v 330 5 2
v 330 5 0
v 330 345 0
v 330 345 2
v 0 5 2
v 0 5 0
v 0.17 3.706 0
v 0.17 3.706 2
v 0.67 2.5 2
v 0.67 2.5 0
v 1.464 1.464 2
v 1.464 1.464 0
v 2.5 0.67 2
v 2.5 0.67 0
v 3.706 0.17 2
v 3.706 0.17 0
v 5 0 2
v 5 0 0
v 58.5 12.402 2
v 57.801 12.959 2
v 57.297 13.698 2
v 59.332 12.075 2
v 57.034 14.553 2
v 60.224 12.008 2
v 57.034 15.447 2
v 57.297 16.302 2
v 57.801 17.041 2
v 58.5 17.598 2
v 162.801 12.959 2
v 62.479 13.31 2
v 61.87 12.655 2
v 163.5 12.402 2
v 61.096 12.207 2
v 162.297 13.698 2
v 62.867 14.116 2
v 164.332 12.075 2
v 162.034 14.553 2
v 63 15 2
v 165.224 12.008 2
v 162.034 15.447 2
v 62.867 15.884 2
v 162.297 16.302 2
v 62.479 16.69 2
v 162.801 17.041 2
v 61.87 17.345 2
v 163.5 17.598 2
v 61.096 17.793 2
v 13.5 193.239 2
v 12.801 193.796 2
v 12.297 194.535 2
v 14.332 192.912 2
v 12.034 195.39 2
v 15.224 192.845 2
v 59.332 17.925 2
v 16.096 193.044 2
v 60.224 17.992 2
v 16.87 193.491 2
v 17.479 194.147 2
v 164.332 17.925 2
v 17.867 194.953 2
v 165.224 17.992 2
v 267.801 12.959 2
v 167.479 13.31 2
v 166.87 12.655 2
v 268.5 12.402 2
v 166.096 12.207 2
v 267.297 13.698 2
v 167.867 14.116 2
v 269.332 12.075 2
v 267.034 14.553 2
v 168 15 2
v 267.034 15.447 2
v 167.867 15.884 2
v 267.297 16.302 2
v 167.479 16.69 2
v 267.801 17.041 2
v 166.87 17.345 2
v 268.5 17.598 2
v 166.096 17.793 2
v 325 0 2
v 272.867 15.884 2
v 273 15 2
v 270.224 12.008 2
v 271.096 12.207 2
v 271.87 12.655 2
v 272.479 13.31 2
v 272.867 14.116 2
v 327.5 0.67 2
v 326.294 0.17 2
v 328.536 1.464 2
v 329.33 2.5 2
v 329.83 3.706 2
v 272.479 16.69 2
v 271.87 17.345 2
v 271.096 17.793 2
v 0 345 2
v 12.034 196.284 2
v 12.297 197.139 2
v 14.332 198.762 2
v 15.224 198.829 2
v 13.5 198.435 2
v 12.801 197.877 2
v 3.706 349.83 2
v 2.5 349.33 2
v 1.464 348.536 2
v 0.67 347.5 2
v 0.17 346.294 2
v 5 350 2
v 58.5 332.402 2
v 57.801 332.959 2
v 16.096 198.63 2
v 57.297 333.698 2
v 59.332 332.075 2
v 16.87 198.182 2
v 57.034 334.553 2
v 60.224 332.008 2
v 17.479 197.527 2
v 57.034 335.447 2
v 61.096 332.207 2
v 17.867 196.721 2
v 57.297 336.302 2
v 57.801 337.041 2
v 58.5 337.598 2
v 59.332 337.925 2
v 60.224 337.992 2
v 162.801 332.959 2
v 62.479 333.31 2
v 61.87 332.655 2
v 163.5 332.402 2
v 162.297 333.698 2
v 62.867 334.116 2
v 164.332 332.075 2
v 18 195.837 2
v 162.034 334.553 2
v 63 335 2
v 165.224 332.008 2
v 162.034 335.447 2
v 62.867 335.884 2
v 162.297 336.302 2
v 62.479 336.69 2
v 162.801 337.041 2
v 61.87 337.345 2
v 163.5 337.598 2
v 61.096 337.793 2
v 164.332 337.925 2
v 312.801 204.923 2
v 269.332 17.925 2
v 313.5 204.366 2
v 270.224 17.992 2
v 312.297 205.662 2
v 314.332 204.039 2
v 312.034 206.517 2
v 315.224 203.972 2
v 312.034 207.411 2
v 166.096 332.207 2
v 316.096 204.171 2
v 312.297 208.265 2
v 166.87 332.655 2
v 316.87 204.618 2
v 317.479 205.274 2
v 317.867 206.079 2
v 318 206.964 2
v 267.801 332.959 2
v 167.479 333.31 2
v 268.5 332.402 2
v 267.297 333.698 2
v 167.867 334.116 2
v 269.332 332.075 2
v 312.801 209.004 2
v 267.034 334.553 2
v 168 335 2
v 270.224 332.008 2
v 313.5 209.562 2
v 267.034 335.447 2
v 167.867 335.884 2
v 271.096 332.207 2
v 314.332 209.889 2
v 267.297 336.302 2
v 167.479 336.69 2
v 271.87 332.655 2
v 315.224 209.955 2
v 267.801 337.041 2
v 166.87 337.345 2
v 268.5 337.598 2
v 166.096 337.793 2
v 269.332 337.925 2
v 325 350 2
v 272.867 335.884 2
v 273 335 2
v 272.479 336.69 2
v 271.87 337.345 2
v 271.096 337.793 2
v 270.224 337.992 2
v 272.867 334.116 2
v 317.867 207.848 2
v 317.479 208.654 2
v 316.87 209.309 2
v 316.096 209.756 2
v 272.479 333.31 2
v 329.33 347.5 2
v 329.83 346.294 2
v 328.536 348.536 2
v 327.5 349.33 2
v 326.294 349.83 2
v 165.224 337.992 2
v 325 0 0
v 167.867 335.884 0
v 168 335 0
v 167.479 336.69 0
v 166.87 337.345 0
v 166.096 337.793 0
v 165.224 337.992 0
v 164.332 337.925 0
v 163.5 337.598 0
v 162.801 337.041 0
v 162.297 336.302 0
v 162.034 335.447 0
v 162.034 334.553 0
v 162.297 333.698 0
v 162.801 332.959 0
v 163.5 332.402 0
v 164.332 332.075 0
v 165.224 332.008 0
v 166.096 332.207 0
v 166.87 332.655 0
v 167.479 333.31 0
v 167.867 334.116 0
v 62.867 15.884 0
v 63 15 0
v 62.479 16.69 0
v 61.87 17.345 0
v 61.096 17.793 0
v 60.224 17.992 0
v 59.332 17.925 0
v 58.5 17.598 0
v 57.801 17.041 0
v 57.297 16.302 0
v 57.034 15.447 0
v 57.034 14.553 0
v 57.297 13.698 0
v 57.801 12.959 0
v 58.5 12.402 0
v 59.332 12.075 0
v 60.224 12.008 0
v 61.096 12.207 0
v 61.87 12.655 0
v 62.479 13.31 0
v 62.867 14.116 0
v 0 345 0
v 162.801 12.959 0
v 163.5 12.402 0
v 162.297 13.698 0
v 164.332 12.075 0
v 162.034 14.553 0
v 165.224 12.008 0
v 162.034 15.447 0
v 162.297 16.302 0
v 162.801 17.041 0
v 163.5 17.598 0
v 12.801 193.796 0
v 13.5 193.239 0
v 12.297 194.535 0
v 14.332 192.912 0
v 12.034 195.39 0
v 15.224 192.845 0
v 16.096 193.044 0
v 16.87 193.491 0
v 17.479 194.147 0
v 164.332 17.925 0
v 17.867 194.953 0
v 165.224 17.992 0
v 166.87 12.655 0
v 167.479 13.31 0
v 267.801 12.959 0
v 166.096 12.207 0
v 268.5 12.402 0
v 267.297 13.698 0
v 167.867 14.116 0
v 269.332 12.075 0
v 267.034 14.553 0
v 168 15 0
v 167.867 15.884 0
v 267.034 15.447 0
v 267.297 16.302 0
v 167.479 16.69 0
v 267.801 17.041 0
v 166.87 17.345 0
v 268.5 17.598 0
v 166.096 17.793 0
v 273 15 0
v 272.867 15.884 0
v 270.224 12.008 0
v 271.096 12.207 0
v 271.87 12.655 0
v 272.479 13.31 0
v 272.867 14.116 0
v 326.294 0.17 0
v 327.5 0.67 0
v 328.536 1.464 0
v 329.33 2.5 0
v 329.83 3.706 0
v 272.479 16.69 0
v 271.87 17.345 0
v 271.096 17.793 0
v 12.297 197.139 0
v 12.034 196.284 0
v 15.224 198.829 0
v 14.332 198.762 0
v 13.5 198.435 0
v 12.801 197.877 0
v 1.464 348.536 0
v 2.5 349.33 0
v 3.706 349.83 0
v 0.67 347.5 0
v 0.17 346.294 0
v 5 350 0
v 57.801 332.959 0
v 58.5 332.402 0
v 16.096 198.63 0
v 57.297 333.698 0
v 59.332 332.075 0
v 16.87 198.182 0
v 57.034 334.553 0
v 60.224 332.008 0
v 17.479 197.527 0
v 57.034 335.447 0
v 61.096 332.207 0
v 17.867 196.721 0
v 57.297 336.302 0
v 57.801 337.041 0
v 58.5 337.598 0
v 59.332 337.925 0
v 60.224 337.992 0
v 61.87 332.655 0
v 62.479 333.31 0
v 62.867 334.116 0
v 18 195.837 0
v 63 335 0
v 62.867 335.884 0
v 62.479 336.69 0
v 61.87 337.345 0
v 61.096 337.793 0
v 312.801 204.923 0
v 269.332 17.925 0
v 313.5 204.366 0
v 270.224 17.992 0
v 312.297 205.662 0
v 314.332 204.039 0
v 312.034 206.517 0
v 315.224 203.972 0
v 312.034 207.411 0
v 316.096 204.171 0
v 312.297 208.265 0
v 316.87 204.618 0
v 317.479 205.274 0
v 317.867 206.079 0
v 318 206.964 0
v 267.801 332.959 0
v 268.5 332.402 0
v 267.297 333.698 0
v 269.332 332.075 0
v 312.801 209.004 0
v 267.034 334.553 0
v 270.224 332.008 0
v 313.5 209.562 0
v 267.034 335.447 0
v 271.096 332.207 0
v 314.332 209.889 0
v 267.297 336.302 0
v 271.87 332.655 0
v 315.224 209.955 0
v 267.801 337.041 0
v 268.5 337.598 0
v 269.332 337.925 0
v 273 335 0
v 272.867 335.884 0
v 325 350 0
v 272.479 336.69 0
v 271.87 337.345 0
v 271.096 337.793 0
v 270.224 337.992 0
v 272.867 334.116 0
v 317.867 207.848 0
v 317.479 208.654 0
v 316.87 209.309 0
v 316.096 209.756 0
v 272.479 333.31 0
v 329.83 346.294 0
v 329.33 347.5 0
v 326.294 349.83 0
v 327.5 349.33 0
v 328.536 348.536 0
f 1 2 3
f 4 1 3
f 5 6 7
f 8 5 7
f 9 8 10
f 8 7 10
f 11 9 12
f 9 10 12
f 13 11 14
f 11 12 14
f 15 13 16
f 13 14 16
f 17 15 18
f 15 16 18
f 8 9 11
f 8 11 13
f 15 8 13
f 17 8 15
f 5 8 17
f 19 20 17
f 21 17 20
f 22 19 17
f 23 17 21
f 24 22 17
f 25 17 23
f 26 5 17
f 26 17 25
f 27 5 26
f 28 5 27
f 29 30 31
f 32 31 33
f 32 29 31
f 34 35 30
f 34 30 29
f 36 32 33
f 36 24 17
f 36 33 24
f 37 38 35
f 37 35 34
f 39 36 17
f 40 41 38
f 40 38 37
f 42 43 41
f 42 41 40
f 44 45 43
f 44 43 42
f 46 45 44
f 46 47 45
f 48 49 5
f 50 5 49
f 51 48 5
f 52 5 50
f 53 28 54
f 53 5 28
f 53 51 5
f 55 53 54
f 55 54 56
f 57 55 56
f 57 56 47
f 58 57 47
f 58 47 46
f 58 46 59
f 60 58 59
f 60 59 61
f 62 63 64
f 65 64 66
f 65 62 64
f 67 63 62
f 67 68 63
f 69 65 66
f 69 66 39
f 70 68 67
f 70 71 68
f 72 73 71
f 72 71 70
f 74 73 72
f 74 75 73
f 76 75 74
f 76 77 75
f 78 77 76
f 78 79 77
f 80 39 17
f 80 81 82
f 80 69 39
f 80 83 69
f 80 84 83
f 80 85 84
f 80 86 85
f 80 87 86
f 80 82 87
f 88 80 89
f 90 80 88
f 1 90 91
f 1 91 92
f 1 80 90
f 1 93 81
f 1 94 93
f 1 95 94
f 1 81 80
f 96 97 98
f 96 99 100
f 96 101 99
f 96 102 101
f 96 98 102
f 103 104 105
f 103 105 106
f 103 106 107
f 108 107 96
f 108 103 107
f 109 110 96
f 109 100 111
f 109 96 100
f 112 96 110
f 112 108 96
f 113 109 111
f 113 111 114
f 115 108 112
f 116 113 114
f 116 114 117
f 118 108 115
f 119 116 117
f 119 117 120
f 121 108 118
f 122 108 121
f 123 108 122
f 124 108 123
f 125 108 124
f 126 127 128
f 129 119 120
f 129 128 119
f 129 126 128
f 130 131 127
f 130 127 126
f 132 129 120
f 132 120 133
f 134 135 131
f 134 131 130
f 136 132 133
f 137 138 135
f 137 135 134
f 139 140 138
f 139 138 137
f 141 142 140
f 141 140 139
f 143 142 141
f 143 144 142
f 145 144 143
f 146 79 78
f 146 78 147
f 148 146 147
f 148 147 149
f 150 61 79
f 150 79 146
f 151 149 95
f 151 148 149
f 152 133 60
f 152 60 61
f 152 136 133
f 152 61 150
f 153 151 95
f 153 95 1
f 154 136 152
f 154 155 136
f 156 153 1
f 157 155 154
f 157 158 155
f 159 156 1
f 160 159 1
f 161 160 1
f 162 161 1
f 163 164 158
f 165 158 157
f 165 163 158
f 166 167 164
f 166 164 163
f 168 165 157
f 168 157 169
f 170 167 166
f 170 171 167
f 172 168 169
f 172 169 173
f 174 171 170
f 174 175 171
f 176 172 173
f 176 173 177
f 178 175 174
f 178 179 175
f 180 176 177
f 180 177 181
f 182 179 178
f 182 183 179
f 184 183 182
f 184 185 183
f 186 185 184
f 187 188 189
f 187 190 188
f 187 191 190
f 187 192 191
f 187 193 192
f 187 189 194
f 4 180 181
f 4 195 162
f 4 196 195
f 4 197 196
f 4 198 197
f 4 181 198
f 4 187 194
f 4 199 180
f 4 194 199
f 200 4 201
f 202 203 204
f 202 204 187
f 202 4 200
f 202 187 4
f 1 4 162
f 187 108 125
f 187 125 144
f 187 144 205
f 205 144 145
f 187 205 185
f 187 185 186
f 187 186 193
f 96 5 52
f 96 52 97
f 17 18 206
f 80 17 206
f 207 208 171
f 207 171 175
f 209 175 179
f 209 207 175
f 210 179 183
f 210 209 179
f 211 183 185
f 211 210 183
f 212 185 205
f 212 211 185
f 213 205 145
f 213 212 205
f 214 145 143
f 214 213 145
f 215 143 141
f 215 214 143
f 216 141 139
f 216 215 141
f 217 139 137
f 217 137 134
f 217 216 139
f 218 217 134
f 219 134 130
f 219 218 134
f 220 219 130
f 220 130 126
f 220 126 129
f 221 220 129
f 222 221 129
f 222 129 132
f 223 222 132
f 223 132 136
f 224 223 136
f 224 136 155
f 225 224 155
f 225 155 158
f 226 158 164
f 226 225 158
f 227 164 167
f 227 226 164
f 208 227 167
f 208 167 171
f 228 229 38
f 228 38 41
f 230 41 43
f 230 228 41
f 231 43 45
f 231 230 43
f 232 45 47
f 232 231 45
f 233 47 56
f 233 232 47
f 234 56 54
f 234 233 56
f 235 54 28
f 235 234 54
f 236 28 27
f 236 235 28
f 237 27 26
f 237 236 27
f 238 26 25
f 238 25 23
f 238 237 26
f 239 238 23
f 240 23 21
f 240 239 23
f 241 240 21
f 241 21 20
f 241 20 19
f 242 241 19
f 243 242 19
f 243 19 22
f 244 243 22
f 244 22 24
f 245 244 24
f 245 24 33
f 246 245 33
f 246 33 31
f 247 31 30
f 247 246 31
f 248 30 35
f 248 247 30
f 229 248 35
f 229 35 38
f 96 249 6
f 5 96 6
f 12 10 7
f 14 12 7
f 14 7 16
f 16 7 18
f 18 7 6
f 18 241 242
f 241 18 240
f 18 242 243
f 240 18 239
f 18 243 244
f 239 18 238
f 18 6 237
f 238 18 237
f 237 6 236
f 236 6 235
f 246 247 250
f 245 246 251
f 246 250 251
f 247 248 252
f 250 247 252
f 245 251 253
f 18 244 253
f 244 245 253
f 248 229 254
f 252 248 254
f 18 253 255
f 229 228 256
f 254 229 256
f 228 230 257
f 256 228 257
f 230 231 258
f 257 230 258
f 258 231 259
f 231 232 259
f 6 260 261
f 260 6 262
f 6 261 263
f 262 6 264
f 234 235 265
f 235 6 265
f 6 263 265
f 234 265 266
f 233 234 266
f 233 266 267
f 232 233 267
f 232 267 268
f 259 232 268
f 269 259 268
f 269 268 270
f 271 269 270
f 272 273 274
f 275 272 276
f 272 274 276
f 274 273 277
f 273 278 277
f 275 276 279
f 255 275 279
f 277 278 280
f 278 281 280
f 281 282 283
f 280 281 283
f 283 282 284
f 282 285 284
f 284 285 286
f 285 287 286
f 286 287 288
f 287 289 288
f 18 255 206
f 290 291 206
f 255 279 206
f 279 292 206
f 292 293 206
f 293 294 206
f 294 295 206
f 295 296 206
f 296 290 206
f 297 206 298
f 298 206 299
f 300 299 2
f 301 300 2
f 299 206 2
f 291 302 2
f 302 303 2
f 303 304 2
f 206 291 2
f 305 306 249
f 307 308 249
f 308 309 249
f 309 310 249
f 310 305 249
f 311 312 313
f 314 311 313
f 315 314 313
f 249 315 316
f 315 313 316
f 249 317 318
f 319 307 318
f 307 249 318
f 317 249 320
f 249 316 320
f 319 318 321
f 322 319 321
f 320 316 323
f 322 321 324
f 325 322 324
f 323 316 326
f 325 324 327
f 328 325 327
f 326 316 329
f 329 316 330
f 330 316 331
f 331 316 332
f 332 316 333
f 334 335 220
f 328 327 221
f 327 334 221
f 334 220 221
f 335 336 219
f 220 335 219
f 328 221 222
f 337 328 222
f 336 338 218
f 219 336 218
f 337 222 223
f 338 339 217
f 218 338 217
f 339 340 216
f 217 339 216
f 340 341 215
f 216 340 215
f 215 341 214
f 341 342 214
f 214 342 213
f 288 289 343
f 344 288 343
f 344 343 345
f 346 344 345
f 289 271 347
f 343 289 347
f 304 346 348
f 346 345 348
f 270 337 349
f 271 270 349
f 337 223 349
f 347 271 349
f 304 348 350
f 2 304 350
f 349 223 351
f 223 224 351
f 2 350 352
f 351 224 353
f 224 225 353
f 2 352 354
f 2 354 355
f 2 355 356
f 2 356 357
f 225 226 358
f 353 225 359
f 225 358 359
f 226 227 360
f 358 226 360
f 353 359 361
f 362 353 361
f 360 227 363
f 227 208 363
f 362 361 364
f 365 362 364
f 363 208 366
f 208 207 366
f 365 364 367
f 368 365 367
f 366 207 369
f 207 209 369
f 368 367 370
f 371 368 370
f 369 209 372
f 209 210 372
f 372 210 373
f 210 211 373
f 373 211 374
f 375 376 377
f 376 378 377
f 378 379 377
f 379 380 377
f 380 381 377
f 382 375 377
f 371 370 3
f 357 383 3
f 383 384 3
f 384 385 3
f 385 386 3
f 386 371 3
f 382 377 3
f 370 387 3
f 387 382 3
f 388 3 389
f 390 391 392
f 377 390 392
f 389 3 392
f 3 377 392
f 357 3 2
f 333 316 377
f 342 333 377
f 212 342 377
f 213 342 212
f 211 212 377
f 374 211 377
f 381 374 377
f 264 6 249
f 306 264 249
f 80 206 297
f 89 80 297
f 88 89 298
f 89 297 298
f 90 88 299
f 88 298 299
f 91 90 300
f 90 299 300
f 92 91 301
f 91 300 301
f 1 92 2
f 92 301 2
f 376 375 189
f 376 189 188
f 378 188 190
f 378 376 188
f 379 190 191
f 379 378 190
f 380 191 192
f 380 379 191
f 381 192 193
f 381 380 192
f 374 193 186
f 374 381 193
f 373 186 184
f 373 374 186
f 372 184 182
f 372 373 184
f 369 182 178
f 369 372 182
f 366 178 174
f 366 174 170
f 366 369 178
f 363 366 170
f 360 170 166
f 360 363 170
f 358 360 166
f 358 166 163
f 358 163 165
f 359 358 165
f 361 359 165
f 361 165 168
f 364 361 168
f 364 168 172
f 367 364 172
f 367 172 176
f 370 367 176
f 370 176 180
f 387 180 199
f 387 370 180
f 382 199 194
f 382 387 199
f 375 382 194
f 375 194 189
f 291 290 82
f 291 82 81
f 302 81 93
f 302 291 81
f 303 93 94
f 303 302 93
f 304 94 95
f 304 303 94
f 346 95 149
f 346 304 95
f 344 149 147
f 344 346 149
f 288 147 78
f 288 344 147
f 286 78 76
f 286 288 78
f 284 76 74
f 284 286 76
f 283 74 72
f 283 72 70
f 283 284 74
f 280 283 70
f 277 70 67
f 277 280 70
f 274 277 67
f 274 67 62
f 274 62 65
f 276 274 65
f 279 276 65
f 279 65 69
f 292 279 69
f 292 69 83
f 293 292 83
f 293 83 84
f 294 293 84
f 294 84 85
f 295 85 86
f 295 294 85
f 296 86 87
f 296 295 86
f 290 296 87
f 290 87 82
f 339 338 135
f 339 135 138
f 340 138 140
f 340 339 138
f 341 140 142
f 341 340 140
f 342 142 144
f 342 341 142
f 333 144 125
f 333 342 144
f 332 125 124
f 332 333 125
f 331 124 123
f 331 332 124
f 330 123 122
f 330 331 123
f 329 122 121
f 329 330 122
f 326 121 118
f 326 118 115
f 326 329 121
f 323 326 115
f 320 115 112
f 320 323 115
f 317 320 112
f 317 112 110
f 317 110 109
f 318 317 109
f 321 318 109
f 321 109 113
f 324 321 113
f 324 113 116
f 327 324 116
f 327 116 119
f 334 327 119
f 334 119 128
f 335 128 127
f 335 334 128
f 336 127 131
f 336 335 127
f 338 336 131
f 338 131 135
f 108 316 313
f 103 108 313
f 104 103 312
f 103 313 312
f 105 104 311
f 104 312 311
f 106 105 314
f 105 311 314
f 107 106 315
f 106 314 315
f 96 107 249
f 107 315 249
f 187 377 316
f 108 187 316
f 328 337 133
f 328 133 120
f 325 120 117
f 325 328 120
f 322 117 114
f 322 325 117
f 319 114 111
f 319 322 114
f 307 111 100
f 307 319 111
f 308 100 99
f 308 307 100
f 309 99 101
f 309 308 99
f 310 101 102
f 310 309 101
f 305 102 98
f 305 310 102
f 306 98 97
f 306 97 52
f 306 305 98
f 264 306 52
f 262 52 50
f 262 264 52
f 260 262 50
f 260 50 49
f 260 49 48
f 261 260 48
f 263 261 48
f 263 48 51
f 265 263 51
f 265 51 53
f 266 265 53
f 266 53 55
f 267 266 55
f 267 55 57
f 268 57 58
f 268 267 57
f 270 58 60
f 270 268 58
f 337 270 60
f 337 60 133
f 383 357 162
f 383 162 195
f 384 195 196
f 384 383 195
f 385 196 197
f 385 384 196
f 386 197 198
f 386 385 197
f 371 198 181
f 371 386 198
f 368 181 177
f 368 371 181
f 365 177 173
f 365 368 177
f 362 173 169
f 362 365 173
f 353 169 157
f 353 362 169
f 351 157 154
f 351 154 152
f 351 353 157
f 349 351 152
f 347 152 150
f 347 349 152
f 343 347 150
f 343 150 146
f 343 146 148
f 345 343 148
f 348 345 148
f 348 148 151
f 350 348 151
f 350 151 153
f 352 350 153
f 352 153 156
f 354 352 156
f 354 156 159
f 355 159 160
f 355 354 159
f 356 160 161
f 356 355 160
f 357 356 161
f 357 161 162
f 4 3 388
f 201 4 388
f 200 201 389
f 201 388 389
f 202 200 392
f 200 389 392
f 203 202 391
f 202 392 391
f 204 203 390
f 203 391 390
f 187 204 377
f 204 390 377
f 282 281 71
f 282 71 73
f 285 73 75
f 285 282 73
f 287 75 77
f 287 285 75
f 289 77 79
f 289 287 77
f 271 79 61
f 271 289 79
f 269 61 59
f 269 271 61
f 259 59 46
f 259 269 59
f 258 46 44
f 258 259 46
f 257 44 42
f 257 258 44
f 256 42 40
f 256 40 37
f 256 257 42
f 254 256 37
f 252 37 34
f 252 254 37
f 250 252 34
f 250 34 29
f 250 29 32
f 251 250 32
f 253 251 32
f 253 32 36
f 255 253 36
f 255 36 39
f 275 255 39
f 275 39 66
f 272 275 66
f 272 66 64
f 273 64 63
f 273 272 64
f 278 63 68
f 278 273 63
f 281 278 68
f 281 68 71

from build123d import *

# Parameters (mm, degrees)
F0_R     = 3
F1_DEPTH = 2


with BuildPart() as f1:
    # F0 (on Top) → F1 (new body)
    with BuildSketch(Plane.XY):
        with BuildLine():
            ThreePointArc((0, 5), (1.464466, 1.464466), (5, 0))
            Line((5, 0), (325, 0))
            ThreePointArc((325, 0), (328.535534, 1.464466), (330, 5))
            Line((330, 5), (330, 345))
            ThreePointArc((330, 345), (328.535534, 348.535534), (325, 350))
            Line((325, 350), (5, 350))
            ThreePointArc((5, 350), (1.464466, 348.535534), (0, 345))
            Line((0, 345), (0, 5))
        make_face()
        with Locations((60, 15)):
            Circle(F0_R, mode=Mode.SUBTRACT)
        with Locations((165, 15)):
            Circle(F0_R, mode=Mode.SUBTRACT)
        with Locations((270, 15)):
            Circle(F0_R, mode=Mode.SUBTRACT)
        with Locations((15, 195.836976)):
            Circle(F0_R, mode=Mode.SUBTRACT)
        with Locations((60, 335)):
            Circle(F0_R, mode=Mode.SUBTRACT)
        with Locations((315, 206.963733)):
            Circle(F0_R, mode=Mode.SUBTRACT)
        with Locations((165, 335)):
            Circle(F0_R, mode=Mode.SUBTRACT)
        with Locations((270, 335)):
            Circle(F0_R, mode=Mode.SUBTRACT)
    extrude(amount=F1_DEPTH)


solid = f1.part
